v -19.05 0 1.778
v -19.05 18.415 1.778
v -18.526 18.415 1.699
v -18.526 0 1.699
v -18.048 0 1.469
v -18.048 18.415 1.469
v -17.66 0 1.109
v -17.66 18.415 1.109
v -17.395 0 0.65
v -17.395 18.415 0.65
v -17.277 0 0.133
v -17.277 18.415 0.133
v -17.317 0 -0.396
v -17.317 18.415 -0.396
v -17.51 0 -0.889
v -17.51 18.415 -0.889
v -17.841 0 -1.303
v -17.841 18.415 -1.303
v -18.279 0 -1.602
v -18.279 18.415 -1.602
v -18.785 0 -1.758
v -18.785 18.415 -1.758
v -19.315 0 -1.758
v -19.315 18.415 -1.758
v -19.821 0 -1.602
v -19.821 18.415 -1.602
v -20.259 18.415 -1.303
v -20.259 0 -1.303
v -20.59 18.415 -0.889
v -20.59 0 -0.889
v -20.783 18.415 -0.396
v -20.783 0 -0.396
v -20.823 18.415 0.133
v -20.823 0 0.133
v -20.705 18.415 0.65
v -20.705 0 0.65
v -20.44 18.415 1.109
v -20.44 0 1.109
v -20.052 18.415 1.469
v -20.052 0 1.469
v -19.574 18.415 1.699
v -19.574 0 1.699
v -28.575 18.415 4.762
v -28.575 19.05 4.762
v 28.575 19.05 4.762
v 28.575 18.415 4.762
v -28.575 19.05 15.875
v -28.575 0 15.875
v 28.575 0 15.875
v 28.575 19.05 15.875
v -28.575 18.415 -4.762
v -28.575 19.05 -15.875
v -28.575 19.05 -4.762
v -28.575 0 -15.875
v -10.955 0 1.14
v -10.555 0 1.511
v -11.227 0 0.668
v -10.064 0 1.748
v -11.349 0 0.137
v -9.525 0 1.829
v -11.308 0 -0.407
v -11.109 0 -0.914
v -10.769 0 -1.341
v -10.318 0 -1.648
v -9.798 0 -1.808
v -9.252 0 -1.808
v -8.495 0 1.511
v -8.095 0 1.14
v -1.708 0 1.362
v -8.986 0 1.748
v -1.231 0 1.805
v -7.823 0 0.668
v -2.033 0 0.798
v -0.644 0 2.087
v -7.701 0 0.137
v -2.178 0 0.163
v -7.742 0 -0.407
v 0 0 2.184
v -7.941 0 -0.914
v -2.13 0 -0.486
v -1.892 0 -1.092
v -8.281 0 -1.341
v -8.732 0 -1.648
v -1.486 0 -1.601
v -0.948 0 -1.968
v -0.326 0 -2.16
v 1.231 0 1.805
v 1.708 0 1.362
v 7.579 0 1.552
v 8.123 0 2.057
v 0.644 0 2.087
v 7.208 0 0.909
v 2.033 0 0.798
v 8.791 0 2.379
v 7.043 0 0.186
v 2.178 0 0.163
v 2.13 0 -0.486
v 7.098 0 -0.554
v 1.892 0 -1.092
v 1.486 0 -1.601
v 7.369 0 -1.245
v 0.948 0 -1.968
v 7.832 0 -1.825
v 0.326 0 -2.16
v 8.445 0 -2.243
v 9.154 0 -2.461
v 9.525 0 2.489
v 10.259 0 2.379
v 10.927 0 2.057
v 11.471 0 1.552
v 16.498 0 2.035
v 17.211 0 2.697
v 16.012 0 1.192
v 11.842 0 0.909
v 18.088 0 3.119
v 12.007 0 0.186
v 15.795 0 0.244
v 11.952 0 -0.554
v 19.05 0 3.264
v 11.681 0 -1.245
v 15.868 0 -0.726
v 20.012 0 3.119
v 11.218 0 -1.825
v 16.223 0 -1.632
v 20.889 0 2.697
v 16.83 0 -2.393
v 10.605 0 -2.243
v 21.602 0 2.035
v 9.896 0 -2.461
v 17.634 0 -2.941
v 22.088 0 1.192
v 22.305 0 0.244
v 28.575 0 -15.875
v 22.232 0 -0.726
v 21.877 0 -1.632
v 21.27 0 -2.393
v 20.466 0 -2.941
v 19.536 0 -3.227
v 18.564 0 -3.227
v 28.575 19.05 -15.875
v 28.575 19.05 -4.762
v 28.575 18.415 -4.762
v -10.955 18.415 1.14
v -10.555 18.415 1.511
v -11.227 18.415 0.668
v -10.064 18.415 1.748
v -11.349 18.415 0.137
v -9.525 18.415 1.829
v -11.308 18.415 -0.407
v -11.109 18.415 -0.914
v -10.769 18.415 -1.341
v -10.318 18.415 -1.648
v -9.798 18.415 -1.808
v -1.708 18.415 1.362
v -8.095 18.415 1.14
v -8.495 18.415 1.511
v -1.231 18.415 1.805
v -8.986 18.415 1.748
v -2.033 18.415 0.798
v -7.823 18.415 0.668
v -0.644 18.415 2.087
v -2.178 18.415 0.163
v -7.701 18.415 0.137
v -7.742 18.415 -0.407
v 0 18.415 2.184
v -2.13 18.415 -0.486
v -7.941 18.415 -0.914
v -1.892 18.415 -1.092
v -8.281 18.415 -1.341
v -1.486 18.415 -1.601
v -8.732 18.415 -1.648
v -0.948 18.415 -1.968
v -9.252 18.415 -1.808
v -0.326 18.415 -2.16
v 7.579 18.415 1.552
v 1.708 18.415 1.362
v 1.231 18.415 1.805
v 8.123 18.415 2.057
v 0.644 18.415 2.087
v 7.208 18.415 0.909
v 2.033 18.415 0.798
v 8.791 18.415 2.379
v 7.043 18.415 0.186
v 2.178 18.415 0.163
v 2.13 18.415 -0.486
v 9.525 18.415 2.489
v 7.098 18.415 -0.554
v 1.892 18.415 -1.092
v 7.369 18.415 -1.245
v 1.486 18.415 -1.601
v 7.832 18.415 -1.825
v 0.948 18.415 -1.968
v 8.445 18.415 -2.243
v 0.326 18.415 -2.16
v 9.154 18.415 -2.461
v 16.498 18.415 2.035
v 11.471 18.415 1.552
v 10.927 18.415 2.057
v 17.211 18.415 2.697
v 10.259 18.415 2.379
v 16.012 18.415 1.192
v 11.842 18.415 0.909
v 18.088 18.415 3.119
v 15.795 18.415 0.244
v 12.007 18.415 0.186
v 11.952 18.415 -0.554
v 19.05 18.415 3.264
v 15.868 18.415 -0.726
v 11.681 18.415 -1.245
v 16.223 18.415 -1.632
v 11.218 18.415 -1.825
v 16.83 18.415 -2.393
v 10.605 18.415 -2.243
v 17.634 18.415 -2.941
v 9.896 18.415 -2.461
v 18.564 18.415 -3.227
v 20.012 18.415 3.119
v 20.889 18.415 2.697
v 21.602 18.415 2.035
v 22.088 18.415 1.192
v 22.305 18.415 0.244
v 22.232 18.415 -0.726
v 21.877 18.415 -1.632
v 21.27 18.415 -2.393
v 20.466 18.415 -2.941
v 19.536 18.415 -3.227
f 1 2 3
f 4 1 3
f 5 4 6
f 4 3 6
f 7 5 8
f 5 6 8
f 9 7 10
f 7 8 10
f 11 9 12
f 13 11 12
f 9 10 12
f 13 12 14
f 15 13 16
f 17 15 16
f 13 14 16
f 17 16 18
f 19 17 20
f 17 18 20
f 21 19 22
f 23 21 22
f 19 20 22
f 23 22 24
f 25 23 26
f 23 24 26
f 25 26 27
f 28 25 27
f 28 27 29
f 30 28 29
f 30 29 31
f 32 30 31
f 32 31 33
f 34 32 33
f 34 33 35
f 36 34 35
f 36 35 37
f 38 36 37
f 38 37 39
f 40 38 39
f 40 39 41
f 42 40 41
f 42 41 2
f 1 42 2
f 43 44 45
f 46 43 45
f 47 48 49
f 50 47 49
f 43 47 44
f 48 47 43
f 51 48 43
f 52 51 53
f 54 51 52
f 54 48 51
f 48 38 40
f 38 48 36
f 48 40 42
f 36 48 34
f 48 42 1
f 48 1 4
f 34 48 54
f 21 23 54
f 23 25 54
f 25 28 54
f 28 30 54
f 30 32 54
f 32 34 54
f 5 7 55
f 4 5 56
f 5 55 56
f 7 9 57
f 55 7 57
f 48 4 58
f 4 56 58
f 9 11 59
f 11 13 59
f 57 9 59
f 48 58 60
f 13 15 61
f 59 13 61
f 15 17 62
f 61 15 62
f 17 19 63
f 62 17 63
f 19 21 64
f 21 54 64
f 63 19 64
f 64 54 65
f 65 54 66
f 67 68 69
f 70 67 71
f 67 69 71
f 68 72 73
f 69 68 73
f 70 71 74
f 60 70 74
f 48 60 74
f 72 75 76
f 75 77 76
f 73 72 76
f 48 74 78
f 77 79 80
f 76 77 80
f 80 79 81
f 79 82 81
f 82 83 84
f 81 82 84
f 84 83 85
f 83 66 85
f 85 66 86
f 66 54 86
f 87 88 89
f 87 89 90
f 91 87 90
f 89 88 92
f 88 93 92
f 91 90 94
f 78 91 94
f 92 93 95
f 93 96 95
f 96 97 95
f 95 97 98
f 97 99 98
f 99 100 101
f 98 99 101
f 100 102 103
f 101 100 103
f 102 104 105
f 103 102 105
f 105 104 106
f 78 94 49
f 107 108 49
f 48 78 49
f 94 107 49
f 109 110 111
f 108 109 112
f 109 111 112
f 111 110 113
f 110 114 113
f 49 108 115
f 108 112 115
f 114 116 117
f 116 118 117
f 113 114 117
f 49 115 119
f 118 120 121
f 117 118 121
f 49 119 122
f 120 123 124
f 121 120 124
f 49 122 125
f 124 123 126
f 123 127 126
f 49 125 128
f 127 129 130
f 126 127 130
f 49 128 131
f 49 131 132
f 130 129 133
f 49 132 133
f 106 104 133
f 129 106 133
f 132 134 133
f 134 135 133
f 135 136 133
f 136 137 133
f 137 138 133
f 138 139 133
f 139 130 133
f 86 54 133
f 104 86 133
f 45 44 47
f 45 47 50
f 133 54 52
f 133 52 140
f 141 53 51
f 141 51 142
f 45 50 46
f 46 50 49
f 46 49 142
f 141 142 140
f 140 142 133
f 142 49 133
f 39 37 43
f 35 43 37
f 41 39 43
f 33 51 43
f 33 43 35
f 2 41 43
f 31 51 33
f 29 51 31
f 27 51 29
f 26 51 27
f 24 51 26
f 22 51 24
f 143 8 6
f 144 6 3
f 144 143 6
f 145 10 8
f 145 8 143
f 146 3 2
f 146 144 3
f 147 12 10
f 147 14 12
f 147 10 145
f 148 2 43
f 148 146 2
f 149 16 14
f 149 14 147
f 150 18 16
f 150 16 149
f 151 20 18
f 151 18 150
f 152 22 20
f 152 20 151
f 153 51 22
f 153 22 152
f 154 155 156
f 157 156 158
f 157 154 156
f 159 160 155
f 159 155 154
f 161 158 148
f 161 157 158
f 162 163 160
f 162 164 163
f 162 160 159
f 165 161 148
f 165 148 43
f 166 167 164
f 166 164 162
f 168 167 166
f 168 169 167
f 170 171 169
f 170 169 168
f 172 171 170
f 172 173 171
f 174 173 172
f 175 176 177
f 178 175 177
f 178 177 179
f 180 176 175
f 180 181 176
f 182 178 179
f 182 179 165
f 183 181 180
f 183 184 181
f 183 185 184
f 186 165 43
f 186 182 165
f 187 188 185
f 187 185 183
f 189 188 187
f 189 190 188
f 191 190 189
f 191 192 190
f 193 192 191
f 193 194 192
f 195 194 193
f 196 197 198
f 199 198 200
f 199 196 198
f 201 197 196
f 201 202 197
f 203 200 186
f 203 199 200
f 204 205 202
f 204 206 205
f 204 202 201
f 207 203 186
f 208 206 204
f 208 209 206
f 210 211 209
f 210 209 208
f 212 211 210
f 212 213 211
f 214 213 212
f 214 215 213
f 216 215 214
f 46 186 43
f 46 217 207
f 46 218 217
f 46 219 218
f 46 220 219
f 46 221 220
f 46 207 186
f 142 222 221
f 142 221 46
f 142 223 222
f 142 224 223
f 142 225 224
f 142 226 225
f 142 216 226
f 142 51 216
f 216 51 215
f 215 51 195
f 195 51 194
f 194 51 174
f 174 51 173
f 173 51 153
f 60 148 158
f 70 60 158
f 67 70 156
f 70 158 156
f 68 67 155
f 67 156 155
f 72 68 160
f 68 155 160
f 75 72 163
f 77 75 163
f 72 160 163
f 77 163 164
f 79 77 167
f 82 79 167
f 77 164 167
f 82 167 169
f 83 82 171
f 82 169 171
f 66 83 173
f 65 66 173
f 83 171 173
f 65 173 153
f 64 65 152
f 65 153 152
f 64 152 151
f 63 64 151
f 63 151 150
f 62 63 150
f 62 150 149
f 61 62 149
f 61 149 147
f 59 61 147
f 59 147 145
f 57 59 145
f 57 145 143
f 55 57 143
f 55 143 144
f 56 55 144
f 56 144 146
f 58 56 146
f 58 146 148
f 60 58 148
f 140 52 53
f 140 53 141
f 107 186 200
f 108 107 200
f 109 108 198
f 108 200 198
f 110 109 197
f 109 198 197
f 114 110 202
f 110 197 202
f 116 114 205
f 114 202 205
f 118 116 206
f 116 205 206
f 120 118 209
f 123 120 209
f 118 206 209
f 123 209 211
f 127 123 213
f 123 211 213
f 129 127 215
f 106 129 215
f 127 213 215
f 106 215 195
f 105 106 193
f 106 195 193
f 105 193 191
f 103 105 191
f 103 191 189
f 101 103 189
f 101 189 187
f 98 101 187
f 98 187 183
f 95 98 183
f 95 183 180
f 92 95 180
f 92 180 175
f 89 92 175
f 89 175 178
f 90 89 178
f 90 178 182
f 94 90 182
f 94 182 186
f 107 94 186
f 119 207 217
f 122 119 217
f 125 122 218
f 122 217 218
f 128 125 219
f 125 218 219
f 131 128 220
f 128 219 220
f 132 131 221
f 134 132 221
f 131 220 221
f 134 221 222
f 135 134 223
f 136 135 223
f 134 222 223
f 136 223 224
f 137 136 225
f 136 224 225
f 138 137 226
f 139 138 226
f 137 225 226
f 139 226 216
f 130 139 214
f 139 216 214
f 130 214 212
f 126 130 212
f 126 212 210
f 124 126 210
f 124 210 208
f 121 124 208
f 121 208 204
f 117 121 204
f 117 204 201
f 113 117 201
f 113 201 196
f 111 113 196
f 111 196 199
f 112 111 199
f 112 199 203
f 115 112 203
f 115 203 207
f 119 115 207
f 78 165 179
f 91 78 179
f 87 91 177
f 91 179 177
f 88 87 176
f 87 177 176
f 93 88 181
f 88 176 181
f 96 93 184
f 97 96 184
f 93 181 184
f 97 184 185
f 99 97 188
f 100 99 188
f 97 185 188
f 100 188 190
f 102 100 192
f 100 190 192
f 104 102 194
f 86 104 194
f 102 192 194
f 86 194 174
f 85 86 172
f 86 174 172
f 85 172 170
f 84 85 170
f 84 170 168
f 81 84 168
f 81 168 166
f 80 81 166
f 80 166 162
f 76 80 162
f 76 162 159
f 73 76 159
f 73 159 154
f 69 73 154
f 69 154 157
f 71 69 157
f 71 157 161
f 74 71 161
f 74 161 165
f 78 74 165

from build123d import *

# Parameters (mm, degrees)
SKETCH1_W           = 57.15
SKETCH1_H           = 31.75
BOSS_EXTRUDE1_DEPTH = 19.05
SKETCH2_W           = 57.15
SKETCH2_H           = 9.525
CUT_EXTRUDE1_DEPTH  = 0.635
SKETCH3_R           = 1.778
SKETCH3_R_2         = 1.8288
SKETCH3_R_3         = 2.1844
SKETCH3_R_4         = 2.4892
SKETCH3_R_5         = 3.2639
CUT_EXTRUDE2_DEPTH  = 38.518774967


with BuildPart() as part:
    # Sketch1 → Boss-Extrude1 (new body)
    with BuildSketch(Plane(origin=(0, 0, 0), x_dir=(1, 0, 0), z_dir=(0, 1, 0))):
        Rectangle(SKETCH1_W, SKETCH1_H)
    extrude(amount=BOSS_EXTRUDE1_DEPTH)

    # Sketch2 → Cut-Extrude1 (cut)
    with BuildSketch(Plane(origin=(0, 19.05, 0), x_dir=(1, 0, 0), z_dir=(0, 1, 0))):
        Rectangle(SKETCH2_W, SKETCH2_H)
    extrude(amount=-CUT_EXTRUDE1_DEPTH, mode=Mode.SUBTRACT)

    # Sketch3 → Cut-Extrude2 (cut, through all)
    with BuildSketch(Plane(origin=(0, 18.415, 0), x_dir=(1, 0, 0), z_dir=(0, 1, 0))):
        with Locations(Location((-19.05, 0, 0), (0, 0, 270))):
            Circle(SKETCH3_R)
        with Locations(Location((-9.525, 0, 0), (0, 0, 270))):
            Circle(SKETCH3_R_2)
        with Locations(Location((0, 0, 0), (0, 0, 270))):
            Circle(SKETCH3_R_3)
        with Locations(Location((9.525, 0, 0), (0, 0, 270))):
            Circle(SKETCH3_R_4)
        with Locations(Location((19.05, 0, 0), (0, 0, 270))):
            Circle(SKETCH3_R_5)
    extrude(amount=-CUT_EXTRUDE2_DEPTH, mode=Mode.SUBTRACT)


solid = part.part
